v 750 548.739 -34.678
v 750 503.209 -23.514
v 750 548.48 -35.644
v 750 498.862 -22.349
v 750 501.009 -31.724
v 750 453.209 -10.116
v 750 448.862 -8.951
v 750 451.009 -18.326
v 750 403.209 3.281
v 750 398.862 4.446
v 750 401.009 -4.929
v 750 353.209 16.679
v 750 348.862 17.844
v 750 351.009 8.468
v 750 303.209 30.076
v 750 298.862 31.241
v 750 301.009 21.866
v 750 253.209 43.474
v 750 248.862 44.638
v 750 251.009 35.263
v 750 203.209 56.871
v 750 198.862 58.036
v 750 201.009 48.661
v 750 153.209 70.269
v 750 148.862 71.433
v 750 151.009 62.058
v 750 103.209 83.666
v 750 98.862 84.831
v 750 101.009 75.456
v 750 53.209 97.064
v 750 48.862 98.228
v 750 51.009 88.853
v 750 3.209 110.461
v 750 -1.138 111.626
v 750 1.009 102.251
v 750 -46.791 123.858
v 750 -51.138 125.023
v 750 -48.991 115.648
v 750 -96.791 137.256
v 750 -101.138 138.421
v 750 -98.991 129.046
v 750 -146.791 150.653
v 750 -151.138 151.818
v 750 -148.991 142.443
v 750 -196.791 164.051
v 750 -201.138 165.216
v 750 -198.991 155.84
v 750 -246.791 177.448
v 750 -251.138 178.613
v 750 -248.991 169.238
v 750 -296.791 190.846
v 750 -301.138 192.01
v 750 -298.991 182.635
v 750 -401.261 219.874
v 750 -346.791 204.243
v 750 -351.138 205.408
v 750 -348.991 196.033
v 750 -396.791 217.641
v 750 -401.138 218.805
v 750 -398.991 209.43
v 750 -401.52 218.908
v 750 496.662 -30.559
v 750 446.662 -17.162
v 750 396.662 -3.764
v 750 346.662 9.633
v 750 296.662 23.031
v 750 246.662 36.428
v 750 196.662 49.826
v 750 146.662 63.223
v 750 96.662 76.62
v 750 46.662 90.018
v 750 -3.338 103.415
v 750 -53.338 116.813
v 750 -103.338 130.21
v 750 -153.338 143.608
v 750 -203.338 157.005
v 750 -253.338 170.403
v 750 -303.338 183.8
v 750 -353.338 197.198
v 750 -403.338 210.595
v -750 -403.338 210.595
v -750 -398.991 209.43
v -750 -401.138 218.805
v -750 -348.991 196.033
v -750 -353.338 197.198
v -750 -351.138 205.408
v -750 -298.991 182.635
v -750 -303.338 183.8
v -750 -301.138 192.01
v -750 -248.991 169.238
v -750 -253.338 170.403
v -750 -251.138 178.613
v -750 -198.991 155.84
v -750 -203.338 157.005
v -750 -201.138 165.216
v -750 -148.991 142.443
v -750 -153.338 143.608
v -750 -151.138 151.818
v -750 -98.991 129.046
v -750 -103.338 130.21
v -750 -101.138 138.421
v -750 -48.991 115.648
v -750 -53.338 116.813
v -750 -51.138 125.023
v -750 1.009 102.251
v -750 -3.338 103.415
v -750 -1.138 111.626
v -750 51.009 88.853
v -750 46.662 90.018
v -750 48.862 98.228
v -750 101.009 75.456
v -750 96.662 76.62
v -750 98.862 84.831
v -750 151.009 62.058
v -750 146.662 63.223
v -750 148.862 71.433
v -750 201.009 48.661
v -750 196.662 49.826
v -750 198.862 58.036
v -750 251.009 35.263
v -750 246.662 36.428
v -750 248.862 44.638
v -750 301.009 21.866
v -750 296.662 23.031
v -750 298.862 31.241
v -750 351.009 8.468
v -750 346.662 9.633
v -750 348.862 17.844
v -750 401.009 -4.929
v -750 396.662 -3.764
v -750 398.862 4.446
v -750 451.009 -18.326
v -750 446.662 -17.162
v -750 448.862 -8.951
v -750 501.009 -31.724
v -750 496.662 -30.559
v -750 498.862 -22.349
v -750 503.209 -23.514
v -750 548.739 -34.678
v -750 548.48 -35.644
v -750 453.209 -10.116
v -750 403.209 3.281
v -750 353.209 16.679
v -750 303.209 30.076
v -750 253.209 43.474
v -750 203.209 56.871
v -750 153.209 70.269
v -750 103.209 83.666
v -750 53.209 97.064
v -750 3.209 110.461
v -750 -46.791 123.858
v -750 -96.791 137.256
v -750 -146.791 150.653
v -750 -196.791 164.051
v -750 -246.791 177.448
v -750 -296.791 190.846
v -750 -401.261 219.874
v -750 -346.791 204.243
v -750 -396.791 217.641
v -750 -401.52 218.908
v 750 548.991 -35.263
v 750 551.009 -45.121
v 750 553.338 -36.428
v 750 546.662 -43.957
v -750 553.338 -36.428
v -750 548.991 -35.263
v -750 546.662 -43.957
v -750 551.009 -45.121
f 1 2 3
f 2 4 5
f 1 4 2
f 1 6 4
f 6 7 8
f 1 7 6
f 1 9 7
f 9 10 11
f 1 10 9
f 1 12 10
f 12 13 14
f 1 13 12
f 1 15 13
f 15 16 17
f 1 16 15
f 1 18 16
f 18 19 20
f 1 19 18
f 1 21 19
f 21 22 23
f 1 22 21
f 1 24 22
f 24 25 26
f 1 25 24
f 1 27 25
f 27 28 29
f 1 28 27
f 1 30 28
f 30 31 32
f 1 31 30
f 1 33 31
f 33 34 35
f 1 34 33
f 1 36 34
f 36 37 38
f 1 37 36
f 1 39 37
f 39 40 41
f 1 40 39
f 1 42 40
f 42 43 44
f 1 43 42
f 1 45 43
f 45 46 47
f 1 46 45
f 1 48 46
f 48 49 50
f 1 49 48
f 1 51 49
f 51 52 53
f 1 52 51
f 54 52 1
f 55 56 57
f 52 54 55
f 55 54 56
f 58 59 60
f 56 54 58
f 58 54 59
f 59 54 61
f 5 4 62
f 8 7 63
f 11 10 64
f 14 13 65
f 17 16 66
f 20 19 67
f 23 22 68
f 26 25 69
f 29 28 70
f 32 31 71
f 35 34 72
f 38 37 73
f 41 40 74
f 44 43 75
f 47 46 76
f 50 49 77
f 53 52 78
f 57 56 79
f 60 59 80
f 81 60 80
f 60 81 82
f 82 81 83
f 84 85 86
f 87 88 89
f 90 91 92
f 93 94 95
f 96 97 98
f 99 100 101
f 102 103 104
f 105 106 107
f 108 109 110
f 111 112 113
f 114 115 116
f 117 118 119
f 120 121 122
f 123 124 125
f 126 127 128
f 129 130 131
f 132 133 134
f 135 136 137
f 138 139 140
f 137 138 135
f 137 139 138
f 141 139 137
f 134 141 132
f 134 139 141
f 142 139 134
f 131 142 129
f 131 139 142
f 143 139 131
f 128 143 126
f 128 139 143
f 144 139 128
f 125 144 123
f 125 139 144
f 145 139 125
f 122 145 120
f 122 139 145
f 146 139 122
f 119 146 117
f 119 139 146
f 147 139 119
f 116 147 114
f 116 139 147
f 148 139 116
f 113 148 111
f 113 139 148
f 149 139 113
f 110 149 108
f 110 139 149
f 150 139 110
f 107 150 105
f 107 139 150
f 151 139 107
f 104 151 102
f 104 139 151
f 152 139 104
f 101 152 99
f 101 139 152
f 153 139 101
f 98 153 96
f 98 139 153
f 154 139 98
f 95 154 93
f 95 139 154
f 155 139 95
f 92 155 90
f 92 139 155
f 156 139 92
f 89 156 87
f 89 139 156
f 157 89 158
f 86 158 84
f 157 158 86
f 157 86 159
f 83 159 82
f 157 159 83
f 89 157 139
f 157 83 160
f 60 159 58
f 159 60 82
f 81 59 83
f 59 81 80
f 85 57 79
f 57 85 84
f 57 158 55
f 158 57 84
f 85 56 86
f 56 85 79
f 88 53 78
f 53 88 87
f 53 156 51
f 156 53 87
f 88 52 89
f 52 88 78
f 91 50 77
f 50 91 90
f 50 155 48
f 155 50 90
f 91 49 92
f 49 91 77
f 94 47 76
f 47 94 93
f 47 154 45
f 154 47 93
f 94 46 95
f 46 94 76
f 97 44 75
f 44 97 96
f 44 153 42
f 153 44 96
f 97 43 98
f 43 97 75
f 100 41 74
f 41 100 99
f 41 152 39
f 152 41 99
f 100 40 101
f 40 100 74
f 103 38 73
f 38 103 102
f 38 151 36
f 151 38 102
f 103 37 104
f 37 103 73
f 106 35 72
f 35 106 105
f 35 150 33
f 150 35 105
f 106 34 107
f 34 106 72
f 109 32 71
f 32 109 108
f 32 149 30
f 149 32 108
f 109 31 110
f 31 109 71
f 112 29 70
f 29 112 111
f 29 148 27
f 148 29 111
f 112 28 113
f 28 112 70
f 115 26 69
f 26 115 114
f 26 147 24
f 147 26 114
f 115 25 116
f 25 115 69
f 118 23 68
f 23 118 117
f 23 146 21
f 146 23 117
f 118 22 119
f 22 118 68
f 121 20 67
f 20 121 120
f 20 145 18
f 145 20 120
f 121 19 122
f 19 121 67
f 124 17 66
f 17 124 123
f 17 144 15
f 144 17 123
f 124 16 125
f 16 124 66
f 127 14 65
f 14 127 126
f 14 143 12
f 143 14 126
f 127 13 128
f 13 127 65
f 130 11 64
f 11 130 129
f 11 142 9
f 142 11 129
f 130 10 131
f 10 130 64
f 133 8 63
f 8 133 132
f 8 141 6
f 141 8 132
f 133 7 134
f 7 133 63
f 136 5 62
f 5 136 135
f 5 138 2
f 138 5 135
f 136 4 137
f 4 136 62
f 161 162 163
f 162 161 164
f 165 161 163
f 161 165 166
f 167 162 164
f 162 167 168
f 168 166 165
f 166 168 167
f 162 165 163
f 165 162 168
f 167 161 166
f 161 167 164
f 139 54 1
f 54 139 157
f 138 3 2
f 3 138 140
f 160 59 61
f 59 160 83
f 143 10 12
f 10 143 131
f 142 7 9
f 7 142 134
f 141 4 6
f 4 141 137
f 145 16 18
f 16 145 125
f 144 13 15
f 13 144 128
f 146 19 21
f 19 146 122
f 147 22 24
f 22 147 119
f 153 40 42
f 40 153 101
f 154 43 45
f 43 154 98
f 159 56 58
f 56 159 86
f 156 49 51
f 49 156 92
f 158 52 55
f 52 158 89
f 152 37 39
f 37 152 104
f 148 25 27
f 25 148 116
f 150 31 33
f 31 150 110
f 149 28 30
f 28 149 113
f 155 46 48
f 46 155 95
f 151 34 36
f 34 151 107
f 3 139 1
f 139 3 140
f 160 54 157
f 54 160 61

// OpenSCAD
module terraceroof(width=800, length=1200) {
beam_height = 9;
beam_width = 4.5;  
roof_angle = 15;
front_lip = 150;
back_lip = 150;
side_lip = 150;
air_gap = 0;
    
beam_length = length + front_lip + back_lip;

for (pos = [-width/2:50:width/2+side_lip]) {
  translate([(front_lip-back_lip)/2, pos, (pos-width/2)*tan(-roof_angle)+air_gap]) rotate([-roof_angle,0, 0]) cube([beam_length,beam_width,beam_height],center=true);
}

metal_thickness = 1;

translate([(front_lip-back_lip)/2, 0, (0-width/2)*tan(-roof_angle)+air_gap]) rotate([-roof_angle,0, 0]) translate([0,side_lip/2, 4.5]) cube([beam_length, (width+side_lip)/cos(roof_angle),metal_thickness],center=true);

}

terraceroof();
